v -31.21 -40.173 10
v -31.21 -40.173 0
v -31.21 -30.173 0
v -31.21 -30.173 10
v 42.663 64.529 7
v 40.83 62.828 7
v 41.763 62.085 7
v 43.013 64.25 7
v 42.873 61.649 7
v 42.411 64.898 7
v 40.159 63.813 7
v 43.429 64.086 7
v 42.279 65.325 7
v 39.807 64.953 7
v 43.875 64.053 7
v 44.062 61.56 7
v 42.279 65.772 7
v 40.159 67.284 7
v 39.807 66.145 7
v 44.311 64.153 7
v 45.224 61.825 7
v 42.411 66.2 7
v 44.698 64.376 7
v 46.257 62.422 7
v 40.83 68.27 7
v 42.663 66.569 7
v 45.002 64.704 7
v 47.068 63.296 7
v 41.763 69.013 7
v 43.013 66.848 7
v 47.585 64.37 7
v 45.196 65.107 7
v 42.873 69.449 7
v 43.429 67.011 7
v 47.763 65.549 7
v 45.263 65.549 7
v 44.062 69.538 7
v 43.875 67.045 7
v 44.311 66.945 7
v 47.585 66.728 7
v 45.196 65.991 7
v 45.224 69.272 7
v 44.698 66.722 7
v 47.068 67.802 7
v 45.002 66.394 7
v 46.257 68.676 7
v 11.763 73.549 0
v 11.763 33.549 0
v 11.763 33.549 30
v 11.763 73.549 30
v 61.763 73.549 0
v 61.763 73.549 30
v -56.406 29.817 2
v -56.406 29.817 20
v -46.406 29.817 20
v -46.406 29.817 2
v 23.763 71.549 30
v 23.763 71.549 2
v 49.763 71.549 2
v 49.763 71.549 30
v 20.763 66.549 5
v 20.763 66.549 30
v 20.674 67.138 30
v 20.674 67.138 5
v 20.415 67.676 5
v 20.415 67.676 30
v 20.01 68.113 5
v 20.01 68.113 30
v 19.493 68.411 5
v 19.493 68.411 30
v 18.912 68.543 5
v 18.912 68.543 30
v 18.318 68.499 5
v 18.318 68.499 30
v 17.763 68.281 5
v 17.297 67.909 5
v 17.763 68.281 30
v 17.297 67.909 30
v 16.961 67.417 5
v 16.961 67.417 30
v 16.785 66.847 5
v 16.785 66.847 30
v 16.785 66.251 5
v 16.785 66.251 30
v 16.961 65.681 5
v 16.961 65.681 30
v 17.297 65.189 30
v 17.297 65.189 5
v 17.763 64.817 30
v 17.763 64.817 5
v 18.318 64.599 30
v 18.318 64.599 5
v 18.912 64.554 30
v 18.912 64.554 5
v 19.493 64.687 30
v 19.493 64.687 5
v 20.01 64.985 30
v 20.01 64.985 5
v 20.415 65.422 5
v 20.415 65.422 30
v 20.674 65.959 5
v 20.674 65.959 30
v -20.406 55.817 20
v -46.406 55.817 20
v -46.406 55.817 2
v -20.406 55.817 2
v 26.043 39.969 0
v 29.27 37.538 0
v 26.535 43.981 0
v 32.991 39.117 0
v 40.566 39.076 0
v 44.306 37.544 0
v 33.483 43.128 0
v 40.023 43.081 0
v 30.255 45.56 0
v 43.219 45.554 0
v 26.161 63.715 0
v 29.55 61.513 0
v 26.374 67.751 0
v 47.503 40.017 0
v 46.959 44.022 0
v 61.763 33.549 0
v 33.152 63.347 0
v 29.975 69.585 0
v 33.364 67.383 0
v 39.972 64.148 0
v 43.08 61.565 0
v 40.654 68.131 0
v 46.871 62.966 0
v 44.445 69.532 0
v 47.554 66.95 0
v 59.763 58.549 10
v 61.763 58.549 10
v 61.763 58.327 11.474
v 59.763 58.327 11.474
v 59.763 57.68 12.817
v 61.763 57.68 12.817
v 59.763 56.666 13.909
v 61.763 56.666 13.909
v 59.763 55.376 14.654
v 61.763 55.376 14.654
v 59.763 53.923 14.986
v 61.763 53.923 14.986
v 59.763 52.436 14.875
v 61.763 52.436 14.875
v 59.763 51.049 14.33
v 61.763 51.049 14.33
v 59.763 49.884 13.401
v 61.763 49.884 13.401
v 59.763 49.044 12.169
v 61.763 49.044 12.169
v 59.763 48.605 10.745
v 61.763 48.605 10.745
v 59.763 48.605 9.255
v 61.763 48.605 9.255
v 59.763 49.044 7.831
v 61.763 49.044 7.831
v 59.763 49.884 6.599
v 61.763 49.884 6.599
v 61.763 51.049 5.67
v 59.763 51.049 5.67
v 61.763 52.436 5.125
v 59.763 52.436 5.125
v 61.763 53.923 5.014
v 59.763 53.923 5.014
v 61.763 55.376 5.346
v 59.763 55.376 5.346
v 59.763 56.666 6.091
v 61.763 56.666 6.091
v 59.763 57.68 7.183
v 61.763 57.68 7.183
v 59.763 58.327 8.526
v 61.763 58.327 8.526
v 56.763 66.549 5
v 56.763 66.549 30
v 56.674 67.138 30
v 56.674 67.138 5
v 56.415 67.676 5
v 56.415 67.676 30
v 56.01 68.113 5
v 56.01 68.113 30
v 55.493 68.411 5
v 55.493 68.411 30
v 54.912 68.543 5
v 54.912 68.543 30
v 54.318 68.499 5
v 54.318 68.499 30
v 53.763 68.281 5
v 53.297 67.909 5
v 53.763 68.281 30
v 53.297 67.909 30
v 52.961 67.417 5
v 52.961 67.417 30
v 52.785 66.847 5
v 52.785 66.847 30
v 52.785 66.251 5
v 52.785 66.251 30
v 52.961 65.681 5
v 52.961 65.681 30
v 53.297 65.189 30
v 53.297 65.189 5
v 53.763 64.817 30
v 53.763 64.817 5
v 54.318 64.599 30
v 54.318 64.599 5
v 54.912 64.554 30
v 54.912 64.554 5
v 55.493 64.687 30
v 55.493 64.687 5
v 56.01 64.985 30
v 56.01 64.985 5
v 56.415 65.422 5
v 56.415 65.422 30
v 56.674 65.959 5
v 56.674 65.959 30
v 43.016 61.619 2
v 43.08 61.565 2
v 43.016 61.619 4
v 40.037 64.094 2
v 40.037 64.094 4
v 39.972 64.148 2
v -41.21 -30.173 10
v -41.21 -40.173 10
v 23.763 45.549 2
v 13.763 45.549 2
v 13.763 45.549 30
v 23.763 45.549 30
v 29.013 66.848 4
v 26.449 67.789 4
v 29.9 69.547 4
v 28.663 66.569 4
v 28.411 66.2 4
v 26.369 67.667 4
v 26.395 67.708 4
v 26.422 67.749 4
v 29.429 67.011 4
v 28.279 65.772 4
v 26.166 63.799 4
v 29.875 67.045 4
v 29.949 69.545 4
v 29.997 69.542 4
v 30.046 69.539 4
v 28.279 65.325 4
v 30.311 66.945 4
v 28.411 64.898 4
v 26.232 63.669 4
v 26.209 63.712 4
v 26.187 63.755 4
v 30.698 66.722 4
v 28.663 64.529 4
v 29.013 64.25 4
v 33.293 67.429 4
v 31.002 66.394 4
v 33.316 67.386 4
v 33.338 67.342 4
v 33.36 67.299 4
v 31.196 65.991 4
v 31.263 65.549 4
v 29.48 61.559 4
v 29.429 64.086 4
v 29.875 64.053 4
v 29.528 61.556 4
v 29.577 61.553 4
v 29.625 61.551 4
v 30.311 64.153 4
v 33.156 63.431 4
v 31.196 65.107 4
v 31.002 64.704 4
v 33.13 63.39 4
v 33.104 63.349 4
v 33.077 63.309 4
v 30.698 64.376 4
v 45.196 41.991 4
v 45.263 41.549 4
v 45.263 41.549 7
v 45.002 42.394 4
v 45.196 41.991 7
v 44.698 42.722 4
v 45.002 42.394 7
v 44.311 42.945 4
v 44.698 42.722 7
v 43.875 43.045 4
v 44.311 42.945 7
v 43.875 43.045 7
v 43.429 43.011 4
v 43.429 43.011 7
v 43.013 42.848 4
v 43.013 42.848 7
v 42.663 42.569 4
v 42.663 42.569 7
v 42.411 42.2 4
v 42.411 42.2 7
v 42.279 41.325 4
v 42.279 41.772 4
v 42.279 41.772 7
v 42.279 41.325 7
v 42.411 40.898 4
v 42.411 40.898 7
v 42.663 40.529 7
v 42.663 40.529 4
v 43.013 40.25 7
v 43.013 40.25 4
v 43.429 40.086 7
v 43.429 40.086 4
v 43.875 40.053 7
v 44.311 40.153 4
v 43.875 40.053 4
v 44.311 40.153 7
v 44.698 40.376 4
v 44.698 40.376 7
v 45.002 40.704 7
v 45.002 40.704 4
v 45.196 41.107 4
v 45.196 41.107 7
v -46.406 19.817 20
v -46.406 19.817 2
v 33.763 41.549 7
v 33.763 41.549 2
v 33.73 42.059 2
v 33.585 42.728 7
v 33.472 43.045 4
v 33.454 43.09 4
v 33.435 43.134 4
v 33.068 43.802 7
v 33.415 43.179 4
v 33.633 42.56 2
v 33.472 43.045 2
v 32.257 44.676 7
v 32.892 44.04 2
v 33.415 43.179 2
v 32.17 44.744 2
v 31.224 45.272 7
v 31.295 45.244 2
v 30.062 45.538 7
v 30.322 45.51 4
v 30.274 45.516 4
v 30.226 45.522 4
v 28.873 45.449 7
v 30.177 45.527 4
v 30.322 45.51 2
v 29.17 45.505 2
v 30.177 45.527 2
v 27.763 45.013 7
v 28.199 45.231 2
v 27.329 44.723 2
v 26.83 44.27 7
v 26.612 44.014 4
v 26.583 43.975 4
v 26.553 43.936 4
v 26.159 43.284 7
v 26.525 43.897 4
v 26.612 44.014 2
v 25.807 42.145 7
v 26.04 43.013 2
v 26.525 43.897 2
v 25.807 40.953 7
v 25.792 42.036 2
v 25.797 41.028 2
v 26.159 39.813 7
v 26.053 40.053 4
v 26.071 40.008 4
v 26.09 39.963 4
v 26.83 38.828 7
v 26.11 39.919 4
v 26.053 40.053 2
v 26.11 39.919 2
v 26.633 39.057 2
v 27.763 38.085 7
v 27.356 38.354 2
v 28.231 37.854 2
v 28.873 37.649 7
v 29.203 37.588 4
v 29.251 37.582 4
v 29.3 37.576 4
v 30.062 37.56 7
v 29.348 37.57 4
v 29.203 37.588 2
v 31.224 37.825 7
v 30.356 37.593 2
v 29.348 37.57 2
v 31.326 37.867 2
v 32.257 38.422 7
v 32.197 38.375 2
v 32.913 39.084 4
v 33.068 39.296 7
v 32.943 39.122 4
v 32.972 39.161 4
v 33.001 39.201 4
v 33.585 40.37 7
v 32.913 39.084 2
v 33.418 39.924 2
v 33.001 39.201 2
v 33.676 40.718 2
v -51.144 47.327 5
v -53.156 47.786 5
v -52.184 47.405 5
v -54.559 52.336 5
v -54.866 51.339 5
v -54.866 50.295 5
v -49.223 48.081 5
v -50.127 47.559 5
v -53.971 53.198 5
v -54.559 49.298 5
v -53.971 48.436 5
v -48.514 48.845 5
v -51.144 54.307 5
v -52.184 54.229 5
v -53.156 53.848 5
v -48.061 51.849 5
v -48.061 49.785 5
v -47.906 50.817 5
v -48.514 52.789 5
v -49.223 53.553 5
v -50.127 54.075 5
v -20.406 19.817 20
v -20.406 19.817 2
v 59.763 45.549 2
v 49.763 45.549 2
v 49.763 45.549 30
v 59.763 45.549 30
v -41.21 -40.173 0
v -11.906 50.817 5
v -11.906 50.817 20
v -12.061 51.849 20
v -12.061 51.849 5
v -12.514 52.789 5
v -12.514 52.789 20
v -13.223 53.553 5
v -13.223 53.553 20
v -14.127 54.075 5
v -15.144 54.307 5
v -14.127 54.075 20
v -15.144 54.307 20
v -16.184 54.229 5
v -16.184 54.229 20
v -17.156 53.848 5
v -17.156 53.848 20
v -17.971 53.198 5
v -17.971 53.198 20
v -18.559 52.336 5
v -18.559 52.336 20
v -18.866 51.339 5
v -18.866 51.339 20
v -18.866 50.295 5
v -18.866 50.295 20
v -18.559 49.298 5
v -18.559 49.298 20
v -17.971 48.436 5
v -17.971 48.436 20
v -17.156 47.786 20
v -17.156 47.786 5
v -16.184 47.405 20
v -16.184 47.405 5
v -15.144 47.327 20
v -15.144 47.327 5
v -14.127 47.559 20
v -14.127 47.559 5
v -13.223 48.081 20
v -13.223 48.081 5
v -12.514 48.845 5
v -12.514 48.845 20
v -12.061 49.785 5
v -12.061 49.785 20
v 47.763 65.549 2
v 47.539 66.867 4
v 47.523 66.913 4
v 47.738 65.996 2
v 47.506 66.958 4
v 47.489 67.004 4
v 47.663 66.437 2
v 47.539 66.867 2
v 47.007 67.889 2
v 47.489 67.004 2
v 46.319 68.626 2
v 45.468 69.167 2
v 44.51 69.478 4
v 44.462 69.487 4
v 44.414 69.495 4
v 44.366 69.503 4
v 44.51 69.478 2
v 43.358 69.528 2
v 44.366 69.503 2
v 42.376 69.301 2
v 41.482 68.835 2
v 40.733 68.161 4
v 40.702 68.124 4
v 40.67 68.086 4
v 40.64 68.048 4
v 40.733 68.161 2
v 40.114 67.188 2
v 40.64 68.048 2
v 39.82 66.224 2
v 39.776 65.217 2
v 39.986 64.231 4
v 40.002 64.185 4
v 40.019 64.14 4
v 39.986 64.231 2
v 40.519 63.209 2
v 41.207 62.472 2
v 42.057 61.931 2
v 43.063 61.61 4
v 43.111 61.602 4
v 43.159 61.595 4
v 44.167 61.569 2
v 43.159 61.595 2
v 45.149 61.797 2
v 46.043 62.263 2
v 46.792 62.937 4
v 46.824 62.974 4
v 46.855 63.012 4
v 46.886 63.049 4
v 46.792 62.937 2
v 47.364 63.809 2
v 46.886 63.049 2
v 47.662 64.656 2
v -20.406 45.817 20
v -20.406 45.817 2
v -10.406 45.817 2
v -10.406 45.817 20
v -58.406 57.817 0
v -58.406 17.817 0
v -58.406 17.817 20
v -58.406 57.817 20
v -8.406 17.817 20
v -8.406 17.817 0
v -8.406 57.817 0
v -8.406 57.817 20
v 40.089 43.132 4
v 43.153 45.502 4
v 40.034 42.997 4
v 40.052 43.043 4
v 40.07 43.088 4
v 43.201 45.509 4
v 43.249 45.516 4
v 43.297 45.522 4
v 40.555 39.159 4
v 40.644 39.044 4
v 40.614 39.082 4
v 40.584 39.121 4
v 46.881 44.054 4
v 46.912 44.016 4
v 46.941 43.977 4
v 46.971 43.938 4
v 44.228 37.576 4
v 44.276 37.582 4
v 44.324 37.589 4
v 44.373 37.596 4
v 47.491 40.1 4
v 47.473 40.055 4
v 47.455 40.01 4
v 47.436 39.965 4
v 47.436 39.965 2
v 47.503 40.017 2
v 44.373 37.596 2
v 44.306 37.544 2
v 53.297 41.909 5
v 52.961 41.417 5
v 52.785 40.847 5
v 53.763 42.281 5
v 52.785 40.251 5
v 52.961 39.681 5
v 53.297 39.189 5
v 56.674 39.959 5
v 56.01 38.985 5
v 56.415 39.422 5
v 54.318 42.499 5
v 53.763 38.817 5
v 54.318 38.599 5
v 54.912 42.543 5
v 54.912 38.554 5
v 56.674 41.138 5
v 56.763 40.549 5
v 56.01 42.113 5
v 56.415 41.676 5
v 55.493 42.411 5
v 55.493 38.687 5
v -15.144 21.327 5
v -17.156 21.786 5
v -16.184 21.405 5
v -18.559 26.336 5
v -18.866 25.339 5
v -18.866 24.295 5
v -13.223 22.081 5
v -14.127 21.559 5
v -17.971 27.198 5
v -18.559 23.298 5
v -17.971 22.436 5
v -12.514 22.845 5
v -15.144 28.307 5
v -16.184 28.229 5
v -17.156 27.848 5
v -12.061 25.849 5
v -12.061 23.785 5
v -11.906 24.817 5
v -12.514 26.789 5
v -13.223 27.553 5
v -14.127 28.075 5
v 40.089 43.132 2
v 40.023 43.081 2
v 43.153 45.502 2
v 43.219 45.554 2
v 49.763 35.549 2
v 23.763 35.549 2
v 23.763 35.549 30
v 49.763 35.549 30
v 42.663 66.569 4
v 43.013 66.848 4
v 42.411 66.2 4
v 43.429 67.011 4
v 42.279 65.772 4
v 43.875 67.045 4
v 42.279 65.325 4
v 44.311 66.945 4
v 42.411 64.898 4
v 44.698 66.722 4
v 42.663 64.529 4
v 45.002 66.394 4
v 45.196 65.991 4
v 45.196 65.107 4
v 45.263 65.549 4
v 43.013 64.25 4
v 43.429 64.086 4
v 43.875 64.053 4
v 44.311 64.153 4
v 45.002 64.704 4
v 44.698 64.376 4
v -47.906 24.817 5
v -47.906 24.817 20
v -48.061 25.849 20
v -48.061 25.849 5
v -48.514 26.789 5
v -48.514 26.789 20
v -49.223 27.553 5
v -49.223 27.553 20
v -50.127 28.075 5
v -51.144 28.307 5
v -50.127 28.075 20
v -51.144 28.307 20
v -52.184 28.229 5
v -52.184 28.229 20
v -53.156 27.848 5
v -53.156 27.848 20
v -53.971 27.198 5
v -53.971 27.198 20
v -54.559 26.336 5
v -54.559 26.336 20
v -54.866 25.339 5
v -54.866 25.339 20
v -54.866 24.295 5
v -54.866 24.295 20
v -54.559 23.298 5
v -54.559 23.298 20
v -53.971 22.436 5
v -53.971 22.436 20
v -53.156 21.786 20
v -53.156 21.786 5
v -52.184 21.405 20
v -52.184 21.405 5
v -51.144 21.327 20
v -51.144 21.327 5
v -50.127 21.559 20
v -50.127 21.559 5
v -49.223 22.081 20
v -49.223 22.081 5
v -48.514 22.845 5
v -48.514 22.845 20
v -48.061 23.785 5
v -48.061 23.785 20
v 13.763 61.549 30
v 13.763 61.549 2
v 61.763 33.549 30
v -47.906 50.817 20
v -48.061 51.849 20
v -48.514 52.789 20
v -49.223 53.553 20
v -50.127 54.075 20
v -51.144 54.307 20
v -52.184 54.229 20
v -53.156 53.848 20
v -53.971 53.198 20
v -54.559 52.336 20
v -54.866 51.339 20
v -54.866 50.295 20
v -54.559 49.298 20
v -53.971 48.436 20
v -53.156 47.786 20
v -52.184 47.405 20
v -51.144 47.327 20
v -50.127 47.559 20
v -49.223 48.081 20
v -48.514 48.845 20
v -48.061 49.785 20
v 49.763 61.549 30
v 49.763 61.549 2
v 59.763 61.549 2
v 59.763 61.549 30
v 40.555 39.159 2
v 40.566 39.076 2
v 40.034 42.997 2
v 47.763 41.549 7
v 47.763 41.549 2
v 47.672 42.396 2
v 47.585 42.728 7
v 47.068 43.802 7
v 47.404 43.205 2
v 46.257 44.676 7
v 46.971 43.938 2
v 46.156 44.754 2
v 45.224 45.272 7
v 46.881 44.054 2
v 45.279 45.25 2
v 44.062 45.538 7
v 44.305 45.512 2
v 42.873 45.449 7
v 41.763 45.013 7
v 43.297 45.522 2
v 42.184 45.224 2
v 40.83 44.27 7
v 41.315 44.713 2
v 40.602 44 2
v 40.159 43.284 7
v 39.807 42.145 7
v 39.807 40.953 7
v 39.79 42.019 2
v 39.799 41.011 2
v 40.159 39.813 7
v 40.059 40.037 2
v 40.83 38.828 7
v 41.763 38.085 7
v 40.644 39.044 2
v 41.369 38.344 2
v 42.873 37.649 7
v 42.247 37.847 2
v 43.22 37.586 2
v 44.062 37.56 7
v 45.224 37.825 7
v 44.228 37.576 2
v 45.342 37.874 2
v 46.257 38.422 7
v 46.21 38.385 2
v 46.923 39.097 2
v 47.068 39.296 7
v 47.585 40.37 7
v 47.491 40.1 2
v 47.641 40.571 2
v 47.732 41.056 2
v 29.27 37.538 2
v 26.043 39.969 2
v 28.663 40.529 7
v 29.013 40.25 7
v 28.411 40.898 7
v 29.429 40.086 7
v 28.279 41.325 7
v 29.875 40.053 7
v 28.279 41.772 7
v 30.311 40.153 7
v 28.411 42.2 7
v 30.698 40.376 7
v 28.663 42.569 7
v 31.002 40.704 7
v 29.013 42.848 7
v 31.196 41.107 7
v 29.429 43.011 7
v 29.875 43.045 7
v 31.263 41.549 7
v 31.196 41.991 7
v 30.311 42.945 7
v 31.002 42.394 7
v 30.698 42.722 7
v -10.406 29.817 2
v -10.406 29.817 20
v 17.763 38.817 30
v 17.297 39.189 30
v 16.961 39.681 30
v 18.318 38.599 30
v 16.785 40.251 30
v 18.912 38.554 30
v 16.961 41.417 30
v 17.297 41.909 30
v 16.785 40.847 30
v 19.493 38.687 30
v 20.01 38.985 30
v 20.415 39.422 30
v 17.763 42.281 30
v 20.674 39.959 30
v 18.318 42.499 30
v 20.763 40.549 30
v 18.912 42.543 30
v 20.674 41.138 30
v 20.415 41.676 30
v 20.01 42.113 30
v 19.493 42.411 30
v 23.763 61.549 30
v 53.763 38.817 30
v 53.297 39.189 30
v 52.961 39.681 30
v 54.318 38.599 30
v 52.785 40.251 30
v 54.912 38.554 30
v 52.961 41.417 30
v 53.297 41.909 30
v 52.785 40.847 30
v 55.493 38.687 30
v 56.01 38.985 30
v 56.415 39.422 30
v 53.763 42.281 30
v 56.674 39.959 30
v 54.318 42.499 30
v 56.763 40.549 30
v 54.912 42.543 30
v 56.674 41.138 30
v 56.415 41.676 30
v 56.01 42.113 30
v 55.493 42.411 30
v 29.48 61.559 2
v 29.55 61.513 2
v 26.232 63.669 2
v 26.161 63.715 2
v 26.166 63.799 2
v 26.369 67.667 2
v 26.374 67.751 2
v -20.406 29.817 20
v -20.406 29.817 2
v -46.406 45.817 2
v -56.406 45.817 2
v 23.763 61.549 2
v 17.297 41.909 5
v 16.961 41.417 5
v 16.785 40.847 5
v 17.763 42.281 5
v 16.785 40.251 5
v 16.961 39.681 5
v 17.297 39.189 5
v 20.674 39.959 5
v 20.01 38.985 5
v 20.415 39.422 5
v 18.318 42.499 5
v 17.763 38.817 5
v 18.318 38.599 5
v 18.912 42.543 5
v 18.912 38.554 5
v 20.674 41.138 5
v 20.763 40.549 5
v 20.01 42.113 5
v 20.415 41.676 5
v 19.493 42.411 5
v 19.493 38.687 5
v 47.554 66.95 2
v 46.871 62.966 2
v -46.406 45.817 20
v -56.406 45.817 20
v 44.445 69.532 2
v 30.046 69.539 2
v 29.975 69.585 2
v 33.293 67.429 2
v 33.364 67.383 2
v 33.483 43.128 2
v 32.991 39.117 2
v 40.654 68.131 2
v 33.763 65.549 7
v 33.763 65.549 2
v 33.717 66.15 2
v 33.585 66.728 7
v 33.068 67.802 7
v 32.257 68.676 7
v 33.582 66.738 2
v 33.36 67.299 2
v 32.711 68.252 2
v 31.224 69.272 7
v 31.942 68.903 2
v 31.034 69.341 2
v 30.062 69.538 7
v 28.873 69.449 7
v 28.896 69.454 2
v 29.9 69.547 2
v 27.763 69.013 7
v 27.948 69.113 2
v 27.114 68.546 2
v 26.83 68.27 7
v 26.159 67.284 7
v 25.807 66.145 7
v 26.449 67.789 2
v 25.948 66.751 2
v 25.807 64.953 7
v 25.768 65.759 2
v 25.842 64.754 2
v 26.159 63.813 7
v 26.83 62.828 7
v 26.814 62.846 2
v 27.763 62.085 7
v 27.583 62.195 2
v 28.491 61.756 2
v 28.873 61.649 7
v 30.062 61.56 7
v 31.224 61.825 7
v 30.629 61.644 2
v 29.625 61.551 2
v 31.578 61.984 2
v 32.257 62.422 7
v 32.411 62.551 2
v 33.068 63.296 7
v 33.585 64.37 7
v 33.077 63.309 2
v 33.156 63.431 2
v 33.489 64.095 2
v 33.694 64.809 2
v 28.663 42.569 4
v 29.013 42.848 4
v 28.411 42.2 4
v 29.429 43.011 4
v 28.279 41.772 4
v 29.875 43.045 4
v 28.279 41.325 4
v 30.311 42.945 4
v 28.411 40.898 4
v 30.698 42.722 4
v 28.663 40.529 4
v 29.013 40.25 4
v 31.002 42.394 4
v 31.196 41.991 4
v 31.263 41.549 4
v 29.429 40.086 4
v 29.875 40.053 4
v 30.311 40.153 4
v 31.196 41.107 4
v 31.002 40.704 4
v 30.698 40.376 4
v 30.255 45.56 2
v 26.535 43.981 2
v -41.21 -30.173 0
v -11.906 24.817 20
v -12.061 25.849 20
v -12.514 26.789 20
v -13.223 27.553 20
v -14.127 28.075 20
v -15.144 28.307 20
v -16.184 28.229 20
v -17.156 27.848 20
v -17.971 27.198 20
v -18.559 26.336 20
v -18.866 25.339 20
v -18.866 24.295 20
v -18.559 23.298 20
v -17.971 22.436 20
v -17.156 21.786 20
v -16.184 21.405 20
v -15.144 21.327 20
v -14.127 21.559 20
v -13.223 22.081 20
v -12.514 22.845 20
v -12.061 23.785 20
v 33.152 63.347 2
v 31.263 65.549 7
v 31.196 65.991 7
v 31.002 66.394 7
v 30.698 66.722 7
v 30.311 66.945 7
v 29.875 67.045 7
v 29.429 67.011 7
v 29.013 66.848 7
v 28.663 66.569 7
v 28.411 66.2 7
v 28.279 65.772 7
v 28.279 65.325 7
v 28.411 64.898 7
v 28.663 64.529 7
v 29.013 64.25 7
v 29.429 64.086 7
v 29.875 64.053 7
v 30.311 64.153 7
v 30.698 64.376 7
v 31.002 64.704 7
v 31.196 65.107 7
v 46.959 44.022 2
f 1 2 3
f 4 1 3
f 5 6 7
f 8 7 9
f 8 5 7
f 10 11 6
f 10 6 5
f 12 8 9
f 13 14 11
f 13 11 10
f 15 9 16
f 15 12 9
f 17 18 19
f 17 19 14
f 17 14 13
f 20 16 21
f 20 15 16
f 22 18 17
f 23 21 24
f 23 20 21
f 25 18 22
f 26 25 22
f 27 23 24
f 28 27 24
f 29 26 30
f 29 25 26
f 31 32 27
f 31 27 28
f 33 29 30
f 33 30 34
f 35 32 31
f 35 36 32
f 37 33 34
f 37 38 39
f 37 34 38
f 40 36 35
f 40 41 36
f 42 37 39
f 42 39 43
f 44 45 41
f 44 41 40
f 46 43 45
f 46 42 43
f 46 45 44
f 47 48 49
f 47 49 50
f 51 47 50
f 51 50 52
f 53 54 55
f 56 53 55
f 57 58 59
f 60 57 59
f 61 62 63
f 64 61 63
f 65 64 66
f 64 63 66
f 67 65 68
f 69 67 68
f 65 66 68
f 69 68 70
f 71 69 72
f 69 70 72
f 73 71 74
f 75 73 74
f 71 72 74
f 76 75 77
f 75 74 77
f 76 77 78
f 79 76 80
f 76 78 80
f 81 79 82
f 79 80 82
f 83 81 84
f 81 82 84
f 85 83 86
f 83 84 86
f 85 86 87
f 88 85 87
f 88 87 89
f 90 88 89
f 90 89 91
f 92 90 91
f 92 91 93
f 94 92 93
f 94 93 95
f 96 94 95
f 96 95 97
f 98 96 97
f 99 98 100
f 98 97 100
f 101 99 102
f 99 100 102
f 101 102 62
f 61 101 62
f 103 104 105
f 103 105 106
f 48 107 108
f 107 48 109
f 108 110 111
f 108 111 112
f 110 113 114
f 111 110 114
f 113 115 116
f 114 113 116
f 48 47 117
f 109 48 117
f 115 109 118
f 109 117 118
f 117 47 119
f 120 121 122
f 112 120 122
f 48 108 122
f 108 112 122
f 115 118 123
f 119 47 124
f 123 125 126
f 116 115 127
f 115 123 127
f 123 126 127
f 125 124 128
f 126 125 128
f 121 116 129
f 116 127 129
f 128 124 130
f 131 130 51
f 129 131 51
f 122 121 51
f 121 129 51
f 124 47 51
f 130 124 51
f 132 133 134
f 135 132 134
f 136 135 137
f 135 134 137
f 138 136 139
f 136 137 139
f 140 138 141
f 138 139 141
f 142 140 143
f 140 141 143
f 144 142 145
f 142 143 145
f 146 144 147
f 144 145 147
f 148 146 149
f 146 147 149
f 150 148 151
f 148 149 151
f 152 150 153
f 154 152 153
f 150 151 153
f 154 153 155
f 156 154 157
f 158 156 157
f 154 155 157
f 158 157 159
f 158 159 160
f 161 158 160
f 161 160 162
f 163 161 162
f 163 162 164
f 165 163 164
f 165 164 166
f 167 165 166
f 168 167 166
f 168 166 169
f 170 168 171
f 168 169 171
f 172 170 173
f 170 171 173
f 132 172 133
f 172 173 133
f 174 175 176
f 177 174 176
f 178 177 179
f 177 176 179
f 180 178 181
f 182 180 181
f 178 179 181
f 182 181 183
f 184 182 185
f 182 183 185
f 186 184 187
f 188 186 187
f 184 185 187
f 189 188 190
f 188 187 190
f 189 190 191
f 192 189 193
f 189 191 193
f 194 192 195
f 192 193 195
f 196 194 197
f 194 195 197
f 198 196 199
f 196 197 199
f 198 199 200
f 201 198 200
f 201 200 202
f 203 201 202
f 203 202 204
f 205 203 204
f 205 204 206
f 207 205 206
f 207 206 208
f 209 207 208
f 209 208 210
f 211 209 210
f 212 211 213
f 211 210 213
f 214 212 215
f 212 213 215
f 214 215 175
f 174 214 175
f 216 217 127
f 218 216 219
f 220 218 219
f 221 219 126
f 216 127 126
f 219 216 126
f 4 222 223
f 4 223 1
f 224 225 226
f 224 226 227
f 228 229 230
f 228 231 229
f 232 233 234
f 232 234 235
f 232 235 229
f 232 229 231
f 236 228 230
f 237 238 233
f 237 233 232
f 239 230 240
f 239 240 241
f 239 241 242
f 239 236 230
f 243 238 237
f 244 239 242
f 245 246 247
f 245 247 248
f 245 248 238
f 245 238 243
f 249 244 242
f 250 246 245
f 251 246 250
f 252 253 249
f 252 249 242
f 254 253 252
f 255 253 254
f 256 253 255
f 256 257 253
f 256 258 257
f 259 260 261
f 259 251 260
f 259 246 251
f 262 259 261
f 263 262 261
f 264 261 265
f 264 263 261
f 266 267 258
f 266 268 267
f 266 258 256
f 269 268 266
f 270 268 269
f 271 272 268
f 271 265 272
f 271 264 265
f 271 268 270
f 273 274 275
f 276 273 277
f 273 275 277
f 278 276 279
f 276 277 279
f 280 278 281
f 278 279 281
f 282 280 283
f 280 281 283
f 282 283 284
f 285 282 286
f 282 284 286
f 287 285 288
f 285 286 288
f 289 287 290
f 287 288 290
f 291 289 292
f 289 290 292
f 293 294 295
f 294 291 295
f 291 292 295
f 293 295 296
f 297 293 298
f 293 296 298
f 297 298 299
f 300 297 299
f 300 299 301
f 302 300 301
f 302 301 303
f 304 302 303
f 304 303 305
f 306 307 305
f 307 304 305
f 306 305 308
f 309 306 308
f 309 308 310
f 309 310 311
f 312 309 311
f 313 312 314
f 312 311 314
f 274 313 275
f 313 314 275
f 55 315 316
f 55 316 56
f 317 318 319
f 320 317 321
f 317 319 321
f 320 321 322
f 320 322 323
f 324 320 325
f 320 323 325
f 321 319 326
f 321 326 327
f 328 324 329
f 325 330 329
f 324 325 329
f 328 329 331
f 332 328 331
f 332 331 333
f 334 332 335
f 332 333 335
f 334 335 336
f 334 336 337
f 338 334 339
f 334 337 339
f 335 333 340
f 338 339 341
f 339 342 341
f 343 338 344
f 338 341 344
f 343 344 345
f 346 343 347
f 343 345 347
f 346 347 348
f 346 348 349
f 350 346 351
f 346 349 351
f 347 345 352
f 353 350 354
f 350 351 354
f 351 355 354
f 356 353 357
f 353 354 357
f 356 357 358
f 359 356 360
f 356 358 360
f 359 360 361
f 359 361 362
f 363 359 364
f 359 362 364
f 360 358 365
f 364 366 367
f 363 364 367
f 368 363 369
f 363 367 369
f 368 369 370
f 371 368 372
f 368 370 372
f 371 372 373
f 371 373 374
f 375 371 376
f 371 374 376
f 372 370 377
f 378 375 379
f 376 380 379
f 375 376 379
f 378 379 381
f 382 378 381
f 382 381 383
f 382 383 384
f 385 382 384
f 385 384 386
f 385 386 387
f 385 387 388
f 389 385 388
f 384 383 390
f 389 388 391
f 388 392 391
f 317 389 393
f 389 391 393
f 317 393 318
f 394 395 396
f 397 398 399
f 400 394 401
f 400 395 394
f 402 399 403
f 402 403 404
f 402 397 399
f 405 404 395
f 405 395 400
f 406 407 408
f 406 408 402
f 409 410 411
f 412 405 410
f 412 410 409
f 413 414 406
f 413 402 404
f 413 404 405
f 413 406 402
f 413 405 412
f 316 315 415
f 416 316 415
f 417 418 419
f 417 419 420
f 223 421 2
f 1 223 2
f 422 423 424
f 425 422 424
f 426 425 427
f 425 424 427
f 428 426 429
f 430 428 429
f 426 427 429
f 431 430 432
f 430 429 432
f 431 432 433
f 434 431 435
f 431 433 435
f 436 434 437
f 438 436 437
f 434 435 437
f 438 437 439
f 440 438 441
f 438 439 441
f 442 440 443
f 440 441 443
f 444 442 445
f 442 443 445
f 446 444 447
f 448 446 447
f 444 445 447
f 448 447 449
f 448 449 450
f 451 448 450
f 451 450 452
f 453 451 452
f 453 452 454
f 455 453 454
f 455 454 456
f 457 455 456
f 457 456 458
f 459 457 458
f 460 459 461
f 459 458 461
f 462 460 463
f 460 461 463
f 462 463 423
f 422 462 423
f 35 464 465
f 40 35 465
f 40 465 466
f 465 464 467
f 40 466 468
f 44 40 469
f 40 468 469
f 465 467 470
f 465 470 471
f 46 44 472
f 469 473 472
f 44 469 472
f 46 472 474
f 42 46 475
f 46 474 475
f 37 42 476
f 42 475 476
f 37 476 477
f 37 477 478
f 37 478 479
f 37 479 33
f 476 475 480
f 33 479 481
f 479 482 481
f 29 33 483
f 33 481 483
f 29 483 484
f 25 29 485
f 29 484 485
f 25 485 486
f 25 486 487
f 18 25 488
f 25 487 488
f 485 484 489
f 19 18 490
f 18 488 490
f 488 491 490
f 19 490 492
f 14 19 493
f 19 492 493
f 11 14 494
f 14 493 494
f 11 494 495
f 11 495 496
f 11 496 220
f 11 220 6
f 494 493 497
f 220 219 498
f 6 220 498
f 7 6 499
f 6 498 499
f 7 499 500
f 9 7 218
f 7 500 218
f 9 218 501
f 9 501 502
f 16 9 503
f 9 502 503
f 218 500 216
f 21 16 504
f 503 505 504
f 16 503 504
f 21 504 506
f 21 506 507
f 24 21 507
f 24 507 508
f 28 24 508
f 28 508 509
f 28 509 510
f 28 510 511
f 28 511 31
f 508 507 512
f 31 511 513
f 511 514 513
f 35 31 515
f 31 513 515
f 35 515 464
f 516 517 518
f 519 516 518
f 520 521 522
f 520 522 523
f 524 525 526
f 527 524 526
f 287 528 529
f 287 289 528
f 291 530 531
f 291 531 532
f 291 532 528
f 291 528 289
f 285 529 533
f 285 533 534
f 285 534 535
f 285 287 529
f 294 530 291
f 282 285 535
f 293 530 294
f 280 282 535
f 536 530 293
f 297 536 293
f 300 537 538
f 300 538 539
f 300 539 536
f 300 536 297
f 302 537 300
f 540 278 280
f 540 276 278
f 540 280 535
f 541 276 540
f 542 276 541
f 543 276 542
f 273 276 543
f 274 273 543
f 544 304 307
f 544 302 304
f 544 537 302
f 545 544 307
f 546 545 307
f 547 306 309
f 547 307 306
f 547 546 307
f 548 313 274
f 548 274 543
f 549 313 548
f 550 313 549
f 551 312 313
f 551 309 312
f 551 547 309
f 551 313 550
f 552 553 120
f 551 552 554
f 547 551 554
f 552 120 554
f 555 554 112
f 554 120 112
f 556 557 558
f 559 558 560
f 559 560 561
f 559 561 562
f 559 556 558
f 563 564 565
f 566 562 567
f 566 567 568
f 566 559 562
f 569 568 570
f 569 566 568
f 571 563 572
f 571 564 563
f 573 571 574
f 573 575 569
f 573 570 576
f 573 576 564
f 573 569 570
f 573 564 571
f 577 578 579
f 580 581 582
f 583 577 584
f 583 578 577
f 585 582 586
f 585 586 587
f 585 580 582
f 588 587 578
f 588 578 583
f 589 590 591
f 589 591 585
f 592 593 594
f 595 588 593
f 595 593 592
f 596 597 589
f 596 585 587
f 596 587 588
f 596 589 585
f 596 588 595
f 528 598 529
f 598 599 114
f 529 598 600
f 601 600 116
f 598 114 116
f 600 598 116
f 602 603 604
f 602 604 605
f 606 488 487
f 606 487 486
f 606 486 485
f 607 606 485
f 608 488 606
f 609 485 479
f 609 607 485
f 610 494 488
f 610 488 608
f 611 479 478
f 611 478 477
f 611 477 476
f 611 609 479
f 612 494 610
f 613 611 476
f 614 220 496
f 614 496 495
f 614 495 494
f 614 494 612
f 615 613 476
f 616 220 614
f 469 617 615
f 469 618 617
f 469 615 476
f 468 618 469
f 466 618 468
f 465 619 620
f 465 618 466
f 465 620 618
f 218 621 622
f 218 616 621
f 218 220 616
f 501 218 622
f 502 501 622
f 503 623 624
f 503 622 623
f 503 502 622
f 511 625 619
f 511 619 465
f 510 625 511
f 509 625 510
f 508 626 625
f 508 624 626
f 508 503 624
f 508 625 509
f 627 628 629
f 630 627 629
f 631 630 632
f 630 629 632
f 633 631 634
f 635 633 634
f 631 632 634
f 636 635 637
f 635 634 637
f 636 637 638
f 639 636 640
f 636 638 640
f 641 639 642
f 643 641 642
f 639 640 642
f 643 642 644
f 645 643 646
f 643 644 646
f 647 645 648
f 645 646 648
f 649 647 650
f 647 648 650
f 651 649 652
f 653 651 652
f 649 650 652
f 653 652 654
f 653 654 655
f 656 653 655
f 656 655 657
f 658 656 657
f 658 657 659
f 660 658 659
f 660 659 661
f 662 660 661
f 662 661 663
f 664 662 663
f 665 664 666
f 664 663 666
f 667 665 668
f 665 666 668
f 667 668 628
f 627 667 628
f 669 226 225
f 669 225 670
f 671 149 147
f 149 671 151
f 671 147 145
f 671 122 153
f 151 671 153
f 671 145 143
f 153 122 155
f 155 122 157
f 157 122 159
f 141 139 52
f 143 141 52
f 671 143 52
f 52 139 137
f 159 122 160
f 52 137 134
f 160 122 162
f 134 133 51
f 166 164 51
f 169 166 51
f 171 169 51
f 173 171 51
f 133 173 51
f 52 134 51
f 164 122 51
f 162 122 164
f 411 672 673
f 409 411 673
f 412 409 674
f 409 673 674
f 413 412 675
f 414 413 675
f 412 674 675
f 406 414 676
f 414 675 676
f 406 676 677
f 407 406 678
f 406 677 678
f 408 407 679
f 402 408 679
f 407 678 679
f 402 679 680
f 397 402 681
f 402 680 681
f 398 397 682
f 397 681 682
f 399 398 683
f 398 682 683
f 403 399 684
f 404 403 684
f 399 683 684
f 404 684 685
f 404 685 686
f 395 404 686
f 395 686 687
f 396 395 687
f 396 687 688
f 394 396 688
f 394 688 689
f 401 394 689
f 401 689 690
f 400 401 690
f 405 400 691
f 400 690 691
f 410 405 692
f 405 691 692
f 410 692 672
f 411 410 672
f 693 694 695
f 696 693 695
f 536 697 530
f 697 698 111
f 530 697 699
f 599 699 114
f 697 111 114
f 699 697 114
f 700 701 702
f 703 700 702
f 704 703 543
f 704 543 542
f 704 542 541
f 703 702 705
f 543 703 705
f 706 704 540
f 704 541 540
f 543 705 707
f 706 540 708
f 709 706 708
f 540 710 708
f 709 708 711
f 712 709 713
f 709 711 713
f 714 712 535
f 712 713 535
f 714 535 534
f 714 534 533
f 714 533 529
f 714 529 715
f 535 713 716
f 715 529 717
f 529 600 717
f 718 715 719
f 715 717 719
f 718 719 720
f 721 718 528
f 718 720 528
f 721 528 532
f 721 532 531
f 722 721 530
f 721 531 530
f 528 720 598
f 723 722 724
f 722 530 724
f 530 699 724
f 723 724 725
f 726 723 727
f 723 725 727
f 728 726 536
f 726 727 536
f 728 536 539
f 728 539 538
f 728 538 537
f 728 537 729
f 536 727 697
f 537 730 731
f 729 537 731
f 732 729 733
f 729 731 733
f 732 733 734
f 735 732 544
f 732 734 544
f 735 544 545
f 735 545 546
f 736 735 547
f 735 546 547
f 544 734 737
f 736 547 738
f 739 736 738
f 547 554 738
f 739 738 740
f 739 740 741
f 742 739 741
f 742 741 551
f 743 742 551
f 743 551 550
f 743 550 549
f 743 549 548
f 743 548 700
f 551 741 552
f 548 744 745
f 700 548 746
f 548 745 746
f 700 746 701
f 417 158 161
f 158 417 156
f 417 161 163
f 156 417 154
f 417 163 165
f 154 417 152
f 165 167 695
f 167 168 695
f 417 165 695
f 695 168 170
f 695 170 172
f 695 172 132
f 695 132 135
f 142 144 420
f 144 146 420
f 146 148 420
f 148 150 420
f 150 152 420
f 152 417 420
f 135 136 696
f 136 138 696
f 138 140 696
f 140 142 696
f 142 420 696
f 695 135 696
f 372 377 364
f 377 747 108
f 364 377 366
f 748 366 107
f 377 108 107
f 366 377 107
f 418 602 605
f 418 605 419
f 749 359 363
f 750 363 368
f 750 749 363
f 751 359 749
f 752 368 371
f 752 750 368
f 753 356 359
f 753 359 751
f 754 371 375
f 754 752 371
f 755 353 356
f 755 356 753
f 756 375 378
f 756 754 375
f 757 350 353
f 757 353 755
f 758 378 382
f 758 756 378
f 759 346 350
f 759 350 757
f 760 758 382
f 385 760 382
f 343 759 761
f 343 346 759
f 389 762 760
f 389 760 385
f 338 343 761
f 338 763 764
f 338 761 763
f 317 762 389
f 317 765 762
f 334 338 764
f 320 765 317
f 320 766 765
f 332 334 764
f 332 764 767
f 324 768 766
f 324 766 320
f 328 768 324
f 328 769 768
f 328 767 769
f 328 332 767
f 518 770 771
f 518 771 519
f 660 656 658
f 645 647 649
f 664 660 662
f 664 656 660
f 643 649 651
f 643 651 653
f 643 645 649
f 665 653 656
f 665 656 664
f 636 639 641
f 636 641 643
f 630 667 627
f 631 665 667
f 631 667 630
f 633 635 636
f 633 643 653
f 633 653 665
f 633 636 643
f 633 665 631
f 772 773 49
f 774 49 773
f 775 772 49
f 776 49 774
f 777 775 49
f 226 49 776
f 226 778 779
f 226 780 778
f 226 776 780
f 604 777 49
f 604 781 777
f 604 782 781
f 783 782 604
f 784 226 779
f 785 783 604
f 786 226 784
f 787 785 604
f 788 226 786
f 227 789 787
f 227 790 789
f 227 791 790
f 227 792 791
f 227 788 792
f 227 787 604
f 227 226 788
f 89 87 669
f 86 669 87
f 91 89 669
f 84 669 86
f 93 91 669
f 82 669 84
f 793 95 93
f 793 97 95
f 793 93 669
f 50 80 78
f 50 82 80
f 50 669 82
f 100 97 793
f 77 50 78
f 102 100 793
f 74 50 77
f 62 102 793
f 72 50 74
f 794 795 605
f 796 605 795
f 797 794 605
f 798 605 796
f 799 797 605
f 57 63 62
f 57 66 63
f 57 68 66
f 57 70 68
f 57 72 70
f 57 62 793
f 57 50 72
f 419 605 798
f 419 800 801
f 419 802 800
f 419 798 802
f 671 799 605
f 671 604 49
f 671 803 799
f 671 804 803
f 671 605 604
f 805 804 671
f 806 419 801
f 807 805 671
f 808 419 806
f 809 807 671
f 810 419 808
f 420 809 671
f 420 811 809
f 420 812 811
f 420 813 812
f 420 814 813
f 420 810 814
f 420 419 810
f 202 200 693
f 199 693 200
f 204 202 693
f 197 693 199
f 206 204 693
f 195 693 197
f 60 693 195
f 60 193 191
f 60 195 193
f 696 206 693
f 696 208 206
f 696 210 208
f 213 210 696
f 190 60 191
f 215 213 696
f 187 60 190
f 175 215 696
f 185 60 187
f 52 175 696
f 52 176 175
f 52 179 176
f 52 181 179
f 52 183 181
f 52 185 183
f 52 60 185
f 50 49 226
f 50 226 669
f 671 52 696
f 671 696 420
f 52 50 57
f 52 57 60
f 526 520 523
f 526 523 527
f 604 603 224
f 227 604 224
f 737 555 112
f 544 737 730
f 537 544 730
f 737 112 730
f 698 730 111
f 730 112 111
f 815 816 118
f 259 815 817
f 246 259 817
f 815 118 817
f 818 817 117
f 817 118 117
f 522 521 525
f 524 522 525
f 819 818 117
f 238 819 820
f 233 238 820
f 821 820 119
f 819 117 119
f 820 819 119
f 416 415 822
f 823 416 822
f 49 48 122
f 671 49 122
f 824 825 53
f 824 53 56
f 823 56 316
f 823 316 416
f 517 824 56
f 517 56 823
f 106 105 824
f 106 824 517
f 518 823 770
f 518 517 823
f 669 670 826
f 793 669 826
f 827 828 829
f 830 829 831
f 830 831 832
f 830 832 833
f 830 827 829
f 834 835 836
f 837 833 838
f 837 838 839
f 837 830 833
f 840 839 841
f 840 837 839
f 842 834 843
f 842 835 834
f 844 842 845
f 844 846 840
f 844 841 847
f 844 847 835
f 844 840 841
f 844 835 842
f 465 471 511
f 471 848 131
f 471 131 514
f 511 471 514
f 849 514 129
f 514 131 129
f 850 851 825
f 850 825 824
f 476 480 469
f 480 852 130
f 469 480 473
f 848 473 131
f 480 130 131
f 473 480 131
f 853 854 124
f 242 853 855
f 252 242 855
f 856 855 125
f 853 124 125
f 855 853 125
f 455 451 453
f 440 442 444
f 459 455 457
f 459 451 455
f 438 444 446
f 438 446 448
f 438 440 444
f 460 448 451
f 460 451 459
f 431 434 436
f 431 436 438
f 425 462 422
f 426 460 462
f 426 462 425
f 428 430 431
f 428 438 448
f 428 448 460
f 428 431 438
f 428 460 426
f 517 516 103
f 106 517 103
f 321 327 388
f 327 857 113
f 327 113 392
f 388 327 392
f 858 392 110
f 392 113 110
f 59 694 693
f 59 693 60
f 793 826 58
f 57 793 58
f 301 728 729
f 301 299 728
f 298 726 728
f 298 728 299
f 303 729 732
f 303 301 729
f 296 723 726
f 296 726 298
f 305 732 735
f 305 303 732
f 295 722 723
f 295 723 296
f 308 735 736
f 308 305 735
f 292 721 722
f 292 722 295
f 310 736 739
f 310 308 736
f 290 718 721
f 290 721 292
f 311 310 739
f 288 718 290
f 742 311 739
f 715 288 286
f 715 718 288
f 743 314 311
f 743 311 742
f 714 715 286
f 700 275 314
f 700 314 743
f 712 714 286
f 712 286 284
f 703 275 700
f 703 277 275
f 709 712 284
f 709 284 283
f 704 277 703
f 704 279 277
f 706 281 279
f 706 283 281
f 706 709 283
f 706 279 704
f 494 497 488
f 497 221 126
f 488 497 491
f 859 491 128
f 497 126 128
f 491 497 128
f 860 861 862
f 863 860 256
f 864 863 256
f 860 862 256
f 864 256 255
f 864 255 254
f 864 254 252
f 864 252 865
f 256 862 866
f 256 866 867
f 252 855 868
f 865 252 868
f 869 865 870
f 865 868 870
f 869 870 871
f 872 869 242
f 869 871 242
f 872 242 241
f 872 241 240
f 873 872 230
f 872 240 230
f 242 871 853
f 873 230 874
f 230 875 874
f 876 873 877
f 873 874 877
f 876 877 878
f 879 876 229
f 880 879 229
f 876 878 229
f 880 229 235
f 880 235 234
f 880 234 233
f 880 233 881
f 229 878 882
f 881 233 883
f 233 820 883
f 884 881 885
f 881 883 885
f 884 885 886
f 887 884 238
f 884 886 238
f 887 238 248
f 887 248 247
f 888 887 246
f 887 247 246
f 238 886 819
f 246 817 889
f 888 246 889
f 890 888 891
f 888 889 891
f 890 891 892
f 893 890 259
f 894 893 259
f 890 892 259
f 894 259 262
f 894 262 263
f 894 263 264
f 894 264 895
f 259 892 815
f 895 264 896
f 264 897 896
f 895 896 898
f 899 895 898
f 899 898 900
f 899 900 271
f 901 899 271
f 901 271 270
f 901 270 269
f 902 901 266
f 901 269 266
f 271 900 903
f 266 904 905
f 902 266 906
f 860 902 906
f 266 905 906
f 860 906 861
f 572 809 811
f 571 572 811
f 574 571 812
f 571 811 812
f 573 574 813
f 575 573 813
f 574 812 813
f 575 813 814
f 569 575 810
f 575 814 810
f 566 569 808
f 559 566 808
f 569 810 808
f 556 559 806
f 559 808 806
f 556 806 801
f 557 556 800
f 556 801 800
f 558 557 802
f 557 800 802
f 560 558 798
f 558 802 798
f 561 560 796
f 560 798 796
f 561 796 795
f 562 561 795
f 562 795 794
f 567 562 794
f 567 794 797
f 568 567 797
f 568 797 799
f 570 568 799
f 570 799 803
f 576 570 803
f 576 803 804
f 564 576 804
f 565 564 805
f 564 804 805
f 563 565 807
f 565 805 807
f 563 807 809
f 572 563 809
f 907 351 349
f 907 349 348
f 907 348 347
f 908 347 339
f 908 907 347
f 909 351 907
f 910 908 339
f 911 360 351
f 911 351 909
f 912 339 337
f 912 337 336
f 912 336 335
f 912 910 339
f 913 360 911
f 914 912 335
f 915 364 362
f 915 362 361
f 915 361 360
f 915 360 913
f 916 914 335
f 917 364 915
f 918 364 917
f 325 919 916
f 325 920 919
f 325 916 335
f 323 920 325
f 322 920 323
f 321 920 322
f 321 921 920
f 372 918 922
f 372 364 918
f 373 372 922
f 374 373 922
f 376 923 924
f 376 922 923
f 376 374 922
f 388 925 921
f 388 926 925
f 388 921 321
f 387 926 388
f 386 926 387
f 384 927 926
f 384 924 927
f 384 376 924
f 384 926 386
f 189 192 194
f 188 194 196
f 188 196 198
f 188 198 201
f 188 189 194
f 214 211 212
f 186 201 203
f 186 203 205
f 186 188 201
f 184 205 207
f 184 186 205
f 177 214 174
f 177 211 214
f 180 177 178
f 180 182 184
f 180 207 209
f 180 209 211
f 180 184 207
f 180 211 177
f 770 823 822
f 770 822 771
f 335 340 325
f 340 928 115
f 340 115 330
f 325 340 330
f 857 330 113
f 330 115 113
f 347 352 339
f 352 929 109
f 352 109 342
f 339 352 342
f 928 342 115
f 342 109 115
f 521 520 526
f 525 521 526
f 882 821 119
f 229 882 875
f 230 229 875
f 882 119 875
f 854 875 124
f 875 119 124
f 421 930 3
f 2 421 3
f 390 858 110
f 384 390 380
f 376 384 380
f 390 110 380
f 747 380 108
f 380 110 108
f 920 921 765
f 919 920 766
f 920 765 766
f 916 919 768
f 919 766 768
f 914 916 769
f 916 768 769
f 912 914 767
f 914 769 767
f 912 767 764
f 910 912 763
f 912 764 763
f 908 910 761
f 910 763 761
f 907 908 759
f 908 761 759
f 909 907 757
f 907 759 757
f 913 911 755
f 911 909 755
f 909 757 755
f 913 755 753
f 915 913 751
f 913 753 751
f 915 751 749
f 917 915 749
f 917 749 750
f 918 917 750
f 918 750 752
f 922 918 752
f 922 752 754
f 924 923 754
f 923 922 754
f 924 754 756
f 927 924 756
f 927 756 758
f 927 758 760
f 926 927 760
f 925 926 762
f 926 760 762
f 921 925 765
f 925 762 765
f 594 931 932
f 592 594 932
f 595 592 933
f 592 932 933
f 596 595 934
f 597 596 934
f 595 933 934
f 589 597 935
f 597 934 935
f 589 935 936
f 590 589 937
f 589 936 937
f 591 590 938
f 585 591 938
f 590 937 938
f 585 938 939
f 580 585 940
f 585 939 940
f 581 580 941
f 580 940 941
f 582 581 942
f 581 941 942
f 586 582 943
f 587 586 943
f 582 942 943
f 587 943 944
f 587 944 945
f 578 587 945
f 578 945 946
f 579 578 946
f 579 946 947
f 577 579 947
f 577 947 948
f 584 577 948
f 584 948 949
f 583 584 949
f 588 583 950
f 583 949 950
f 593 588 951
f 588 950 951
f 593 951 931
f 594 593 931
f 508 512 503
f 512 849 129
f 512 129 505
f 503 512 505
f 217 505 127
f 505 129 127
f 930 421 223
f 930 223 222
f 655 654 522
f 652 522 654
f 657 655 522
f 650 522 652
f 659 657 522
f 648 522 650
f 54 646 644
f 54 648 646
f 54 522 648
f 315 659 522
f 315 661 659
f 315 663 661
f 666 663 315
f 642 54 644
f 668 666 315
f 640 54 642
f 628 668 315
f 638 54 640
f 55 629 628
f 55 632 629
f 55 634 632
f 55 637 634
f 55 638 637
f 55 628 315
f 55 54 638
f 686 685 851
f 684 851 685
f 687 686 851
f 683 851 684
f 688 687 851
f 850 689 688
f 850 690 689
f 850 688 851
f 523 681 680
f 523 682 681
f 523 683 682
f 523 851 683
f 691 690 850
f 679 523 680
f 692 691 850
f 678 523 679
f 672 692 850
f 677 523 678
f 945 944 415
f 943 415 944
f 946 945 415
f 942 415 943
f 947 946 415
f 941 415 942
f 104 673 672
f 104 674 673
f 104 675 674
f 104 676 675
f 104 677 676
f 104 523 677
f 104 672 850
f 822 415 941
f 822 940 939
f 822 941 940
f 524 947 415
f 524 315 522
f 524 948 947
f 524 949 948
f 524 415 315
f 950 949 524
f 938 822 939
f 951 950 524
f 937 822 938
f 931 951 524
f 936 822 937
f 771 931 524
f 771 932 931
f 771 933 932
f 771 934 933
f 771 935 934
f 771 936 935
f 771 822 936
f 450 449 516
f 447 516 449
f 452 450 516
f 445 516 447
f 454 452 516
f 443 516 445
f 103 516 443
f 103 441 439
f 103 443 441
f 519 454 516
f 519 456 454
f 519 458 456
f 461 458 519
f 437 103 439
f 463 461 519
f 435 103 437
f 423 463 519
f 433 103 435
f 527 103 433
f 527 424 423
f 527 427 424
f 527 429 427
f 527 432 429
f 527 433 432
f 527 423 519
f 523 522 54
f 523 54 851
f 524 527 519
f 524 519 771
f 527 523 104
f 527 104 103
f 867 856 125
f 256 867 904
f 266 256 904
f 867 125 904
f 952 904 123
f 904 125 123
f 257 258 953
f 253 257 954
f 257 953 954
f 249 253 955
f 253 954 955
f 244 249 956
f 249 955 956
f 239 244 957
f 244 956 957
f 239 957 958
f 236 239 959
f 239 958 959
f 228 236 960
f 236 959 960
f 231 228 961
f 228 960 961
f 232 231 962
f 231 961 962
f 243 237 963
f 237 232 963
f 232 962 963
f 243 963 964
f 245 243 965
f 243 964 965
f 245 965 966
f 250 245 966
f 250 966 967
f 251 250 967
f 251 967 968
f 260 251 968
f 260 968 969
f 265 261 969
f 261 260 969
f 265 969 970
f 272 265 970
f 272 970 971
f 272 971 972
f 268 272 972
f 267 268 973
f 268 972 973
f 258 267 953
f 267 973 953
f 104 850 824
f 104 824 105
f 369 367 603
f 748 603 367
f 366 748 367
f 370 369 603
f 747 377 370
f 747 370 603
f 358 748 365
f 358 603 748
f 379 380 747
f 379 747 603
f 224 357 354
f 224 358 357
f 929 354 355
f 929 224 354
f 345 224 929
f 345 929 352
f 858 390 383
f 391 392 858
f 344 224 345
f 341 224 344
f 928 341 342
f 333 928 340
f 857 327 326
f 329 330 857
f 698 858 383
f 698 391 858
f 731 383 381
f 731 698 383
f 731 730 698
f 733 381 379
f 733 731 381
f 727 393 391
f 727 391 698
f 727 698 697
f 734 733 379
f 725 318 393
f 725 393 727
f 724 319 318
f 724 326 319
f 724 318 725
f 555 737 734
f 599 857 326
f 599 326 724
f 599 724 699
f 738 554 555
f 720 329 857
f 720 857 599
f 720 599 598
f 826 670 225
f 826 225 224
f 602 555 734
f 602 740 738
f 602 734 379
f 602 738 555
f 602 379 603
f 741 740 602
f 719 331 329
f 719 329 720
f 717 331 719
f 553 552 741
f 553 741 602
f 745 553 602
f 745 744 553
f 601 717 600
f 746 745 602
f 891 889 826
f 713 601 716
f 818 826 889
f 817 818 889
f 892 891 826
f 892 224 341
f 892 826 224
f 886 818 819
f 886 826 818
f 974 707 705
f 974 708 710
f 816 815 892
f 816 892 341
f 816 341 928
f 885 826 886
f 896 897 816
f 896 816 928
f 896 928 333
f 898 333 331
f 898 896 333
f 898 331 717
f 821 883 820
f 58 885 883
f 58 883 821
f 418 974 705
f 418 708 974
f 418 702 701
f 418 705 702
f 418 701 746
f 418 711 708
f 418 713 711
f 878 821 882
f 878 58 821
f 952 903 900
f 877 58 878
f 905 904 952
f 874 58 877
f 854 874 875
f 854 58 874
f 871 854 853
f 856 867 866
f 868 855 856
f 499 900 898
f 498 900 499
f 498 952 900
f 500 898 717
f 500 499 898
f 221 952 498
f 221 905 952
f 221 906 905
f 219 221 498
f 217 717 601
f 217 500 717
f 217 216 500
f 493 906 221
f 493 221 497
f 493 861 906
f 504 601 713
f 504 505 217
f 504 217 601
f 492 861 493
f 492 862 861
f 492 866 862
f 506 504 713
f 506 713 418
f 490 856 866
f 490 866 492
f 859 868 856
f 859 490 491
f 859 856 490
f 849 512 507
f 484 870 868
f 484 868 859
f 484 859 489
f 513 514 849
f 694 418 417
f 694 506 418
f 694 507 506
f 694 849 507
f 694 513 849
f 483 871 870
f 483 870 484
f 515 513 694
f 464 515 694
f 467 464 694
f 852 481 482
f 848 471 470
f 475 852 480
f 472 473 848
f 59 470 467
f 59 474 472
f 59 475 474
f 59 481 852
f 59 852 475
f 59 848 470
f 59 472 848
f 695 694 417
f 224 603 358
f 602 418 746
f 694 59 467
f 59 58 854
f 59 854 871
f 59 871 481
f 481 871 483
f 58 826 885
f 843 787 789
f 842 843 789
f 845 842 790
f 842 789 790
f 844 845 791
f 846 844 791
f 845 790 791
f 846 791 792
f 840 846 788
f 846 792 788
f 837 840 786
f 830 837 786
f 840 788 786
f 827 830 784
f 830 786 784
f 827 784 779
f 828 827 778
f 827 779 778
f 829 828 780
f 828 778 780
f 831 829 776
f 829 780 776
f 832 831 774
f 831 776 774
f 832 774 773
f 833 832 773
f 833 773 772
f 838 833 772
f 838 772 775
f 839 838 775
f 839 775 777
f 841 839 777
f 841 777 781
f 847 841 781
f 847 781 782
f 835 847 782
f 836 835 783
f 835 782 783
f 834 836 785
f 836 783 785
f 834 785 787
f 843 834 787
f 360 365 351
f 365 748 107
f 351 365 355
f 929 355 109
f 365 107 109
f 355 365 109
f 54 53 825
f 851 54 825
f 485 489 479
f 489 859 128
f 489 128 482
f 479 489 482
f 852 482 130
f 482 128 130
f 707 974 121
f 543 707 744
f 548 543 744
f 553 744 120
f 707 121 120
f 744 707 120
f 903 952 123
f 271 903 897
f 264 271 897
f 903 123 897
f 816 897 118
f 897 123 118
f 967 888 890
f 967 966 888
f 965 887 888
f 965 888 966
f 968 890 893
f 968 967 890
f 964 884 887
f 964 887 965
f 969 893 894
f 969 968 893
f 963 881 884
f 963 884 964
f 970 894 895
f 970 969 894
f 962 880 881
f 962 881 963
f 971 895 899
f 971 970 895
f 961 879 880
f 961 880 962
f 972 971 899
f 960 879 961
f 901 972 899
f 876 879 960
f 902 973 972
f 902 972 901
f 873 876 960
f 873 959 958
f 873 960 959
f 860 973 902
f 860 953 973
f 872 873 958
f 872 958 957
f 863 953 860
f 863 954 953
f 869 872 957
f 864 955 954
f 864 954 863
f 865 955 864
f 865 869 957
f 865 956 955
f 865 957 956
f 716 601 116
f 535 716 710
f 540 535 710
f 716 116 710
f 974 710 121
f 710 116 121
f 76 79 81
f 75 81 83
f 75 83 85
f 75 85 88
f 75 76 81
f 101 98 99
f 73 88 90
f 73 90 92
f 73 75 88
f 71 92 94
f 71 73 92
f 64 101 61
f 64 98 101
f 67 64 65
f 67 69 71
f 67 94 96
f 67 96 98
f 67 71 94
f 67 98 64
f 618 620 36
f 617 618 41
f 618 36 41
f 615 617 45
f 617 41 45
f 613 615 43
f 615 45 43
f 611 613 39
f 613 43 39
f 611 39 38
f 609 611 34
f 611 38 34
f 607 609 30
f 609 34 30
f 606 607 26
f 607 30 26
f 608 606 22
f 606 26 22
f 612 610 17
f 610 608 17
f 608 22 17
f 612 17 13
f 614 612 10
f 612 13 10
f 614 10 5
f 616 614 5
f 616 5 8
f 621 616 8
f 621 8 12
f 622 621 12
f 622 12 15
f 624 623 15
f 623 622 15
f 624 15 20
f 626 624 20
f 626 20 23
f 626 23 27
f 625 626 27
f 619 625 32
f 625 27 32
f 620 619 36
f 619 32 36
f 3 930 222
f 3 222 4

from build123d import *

# Parameters (mm, degrees)
F0_W      = 50
F0_H      = 40
F1_DEPTH  = 20
F2_W      = 46
F2_H      = 36
F3_DEPTH  = 18
F4_W      = 10
F4_H      = 10
F5_DEPTH  = 18
F6_R      = 3.5
F7_DEPTH  = 15
F8_W      = 10
F8_H      = 10
F9_DEPTH  = 10
F10_W     = 50
F10_H     = 40
F11_DEPTH = 30
F12_W     = 46
F12_H     = 36
F13_DEPTH = 28
F14_W     = 10
F14_H     = 10
F15_DEPTH = 28
F16_R     = 2
F17_DEPTH = 25
F18_R     = 4
F19_DEPTH = 5
F22_R     = 1.5
F23_R     = 1.5
F21_R     = 1.5
F20_R     = 1.5
F24_DEPTH = 10
F25_R     = 1.5
F26_DEPTH = 4
F27_R     = 5
F28_DEPTH = 2


with BuildPart() as f1:
    # F0 (on Top) → F1 (new body)
    with BuildSketch(Plane.XY):
        with Locations((-33.405512, 37.816999)):
            Rectangle(F0_W, F0_H)
    extrude(amount=F1_DEPTH)

    # F2 (on face) → F3 (cut)
    with BuildSketch(Plane.XY.offset(20)):
        with Locations((-33.405512, 37.816999)):
            Rectangle(F2_W, F2_H)
    extrude(amount=-F3_DEPTH, mode=Mode.SUBTRACT)

    # F4 (on face) → F5 (join)
    with BuildSketch(Plane.XY.offset(2)):
        with Locations((-51.405512, 50.816999)):
            Rectangle(F4_W, F4_H)
        with Locations((-15.405512, 50.816999)):
            Rectangle(F4_W, F4_H)
        with Locations((-15.405512, 24.816999)):
            Rectangle(F4_W, F4_H)
        with Locations((-51.405512, 24.816999)):
            Rectangle(F4_W, F4_H)
    extrude(amount=F5_DEPTH)

    # F6 (on face) → F7 (cut)
    with BuildSketch(Plane.XY.offset(20)):
        with Locations((-51.405512, 50.816999)):
            Circle(F6_R)
        with Locations((-15.405512, 50.816999)):
            Circle(F6_R)
        with Locations((-15.405512, 24.816999)):
            Circle(F6_R)
        with Locations((-51.405512, 24.816999)):
            Circle(F6_R)
    extrude(amount=-F7_DEPTH, mode=Mode.SUBTRACT)


with BuildPart() as f9:
    # F8 (on Top) → F9 (new body)
    with BuildSketch(Plane.XY):
        with Locations((-36.209533, -35.172561)):
            Rectangle(F8_W, F8_H)
    extrude(amount=F9_DEPTH)


with BuildPart() as f11:
    # F10 (on Top) → F11 (new body)
    with BuildSketch(Plane.XY):
        with Locations((36.76267, 53.548878)):
            Rectangle(F10_W, F10_H)
    extrude(amount=F11_DEPTH)

    # F12 (on face) → F13 (cut)
    with BuildSketch(Plane.XY.offset(30)):
        with Locations((36.76267, 53.548878)):
            Rectangle(F12_W, F12_H)
    extrude(amount=-F13_DEPTH, mode=Mode.SUBTRACT)

    # F14 (on face) → F15 (join)
    with BuildSketch(Plane.XY.offset(2)):
        with Locations((18.76267, 66.548878)):
            Rectangle(F14_W, F14_H)
        with Locations((18.76267, 40.548878)):
            Rectangle(F14_W, F14_H)
        with Locations((54.76267, 66.548878)):
            Rectangle(F14_W, F14_H)
        with Locations((54.76267, 40.548878)):
            Rectangle(F14_W, F14_H)
    extrude(amount=F15_DEPTH)

    # F16 (on face) → F17 (cut)
    with BuildSketch(Plane.XY.offset(30)):
        with Locations((18.76267, 66.548878)):
            Circle(F16_R)
        with Locations((54.76267, 66.548878)):
            Circle(F16_R)
        with Locations((54.76267, 40.548878)):
            Circle(F16_R)
        with Locations((18.76267, 40.548878)):
            Circle(F16_R)
    extrude(amount=-F17_DEPTH, mode=Mode.SUBTRACT)

    # F18 (on face) → F19 (join)
    with BuildSketch(Plane.XY.offset(2)):
        with Locations((29.76267, 65.548878)):
            Circle(F18_R)
        with Locations((43.76267, 65.548878)):
            Circle(F18_R)
        with Locations((29.76267, 41.548878)):
            Circle(F18_R)
        with Locations((43.76267, 41.548878)):
            Circle(F18_R)
    extrude(amount=F19_DEPTH)

    # F22 (on face) + F23 (on face) + F21 (on face) + F20 (on face) → F24 (cut)
    with BuildSketch(Plane.XY.offset(7)):
        with Locations((29.76267, 65.548878)):
            Circle(F22_R)
    with BuildSketch(Plane.XY.offset(7)):
        with Locations((43.76267, 65.548878)):
            Circle(F23_R)
    with BuildSketch(Plane.XY.offset(7)):
        with Locations((43.76267, 41.548878)):
            Circle(F21_R)
    with BuildSketch(Plane.XY.offset(7)):
        with Locations((29.76267, 41.548878)):
            Circle(F20_R)
    extrude(amount=-F24_DEPTH, mode=Mode.SUBTRACT)

    # F25 (on face) → F26 (cut)
    with BuildSketch(Plane(origin=(0, 0, 0), x_dir=(1, 0, 0), z_dir=(0, 0, -1))):
        Polygon((33.482719, -43.128298), (32.990513, -39.116931), (29.270464, -37.53751), (26.042621, -39.969457), (26.534827, -43.980824), (30.254876, -45.560245), align=None)
        with Locations((29.76267, -41.548878)):
            Circle(F25_R, mode=Mode.SUBTRACT)
        Polygon((40.566091, -39.075981), (40.022789, -43.080748), (43.219368, -45.553644), (46.959249, -44.021774), (47.50255, -40.017007), (44.305971, -37.544111), align=None)
        with Locations((43.76267, -41.548878)):
            Circle(F25_R, mode=Mode.SUBTRACT)
        Polygon((43.080384, -61.565434), (39.971764, -64.148033), (40.65405, -68.131476), (44.444956, -69.532321), (47.553576, -66.949722), (46.87129, -62.966279), align=None)
        with Locations((43.76267, -65.548878)):
            Circle(F25_R, mode=Mode.SUBTRACT)
        Polygon((29.550163, -61.513017), (26.161258, -63.714983), (26.373765, -67.750844), (29.975177, -69.584739), (33.364081, -67.382772), (33.151574, -63.346911), align=None)
        with Locations((29.76267, -65.548878)):
            Circle(F25_R, mode=Mode.SUBTRACT)
    extrude(amount=-F26_DEPTH, mode=Mode.SUBTRACT)

    # F27 (on face) → F28 (cut)
    with BuildSketch(Plane.YZ.offset(61.76267)):
        with Locations((53.548878, 10)):
            Circle(F27_R)
    extrude(amount=-F28_DEPTH, mode=Mode.SUBTRACT)


solid = Compound([f1.part, f9.part, f11.part])
